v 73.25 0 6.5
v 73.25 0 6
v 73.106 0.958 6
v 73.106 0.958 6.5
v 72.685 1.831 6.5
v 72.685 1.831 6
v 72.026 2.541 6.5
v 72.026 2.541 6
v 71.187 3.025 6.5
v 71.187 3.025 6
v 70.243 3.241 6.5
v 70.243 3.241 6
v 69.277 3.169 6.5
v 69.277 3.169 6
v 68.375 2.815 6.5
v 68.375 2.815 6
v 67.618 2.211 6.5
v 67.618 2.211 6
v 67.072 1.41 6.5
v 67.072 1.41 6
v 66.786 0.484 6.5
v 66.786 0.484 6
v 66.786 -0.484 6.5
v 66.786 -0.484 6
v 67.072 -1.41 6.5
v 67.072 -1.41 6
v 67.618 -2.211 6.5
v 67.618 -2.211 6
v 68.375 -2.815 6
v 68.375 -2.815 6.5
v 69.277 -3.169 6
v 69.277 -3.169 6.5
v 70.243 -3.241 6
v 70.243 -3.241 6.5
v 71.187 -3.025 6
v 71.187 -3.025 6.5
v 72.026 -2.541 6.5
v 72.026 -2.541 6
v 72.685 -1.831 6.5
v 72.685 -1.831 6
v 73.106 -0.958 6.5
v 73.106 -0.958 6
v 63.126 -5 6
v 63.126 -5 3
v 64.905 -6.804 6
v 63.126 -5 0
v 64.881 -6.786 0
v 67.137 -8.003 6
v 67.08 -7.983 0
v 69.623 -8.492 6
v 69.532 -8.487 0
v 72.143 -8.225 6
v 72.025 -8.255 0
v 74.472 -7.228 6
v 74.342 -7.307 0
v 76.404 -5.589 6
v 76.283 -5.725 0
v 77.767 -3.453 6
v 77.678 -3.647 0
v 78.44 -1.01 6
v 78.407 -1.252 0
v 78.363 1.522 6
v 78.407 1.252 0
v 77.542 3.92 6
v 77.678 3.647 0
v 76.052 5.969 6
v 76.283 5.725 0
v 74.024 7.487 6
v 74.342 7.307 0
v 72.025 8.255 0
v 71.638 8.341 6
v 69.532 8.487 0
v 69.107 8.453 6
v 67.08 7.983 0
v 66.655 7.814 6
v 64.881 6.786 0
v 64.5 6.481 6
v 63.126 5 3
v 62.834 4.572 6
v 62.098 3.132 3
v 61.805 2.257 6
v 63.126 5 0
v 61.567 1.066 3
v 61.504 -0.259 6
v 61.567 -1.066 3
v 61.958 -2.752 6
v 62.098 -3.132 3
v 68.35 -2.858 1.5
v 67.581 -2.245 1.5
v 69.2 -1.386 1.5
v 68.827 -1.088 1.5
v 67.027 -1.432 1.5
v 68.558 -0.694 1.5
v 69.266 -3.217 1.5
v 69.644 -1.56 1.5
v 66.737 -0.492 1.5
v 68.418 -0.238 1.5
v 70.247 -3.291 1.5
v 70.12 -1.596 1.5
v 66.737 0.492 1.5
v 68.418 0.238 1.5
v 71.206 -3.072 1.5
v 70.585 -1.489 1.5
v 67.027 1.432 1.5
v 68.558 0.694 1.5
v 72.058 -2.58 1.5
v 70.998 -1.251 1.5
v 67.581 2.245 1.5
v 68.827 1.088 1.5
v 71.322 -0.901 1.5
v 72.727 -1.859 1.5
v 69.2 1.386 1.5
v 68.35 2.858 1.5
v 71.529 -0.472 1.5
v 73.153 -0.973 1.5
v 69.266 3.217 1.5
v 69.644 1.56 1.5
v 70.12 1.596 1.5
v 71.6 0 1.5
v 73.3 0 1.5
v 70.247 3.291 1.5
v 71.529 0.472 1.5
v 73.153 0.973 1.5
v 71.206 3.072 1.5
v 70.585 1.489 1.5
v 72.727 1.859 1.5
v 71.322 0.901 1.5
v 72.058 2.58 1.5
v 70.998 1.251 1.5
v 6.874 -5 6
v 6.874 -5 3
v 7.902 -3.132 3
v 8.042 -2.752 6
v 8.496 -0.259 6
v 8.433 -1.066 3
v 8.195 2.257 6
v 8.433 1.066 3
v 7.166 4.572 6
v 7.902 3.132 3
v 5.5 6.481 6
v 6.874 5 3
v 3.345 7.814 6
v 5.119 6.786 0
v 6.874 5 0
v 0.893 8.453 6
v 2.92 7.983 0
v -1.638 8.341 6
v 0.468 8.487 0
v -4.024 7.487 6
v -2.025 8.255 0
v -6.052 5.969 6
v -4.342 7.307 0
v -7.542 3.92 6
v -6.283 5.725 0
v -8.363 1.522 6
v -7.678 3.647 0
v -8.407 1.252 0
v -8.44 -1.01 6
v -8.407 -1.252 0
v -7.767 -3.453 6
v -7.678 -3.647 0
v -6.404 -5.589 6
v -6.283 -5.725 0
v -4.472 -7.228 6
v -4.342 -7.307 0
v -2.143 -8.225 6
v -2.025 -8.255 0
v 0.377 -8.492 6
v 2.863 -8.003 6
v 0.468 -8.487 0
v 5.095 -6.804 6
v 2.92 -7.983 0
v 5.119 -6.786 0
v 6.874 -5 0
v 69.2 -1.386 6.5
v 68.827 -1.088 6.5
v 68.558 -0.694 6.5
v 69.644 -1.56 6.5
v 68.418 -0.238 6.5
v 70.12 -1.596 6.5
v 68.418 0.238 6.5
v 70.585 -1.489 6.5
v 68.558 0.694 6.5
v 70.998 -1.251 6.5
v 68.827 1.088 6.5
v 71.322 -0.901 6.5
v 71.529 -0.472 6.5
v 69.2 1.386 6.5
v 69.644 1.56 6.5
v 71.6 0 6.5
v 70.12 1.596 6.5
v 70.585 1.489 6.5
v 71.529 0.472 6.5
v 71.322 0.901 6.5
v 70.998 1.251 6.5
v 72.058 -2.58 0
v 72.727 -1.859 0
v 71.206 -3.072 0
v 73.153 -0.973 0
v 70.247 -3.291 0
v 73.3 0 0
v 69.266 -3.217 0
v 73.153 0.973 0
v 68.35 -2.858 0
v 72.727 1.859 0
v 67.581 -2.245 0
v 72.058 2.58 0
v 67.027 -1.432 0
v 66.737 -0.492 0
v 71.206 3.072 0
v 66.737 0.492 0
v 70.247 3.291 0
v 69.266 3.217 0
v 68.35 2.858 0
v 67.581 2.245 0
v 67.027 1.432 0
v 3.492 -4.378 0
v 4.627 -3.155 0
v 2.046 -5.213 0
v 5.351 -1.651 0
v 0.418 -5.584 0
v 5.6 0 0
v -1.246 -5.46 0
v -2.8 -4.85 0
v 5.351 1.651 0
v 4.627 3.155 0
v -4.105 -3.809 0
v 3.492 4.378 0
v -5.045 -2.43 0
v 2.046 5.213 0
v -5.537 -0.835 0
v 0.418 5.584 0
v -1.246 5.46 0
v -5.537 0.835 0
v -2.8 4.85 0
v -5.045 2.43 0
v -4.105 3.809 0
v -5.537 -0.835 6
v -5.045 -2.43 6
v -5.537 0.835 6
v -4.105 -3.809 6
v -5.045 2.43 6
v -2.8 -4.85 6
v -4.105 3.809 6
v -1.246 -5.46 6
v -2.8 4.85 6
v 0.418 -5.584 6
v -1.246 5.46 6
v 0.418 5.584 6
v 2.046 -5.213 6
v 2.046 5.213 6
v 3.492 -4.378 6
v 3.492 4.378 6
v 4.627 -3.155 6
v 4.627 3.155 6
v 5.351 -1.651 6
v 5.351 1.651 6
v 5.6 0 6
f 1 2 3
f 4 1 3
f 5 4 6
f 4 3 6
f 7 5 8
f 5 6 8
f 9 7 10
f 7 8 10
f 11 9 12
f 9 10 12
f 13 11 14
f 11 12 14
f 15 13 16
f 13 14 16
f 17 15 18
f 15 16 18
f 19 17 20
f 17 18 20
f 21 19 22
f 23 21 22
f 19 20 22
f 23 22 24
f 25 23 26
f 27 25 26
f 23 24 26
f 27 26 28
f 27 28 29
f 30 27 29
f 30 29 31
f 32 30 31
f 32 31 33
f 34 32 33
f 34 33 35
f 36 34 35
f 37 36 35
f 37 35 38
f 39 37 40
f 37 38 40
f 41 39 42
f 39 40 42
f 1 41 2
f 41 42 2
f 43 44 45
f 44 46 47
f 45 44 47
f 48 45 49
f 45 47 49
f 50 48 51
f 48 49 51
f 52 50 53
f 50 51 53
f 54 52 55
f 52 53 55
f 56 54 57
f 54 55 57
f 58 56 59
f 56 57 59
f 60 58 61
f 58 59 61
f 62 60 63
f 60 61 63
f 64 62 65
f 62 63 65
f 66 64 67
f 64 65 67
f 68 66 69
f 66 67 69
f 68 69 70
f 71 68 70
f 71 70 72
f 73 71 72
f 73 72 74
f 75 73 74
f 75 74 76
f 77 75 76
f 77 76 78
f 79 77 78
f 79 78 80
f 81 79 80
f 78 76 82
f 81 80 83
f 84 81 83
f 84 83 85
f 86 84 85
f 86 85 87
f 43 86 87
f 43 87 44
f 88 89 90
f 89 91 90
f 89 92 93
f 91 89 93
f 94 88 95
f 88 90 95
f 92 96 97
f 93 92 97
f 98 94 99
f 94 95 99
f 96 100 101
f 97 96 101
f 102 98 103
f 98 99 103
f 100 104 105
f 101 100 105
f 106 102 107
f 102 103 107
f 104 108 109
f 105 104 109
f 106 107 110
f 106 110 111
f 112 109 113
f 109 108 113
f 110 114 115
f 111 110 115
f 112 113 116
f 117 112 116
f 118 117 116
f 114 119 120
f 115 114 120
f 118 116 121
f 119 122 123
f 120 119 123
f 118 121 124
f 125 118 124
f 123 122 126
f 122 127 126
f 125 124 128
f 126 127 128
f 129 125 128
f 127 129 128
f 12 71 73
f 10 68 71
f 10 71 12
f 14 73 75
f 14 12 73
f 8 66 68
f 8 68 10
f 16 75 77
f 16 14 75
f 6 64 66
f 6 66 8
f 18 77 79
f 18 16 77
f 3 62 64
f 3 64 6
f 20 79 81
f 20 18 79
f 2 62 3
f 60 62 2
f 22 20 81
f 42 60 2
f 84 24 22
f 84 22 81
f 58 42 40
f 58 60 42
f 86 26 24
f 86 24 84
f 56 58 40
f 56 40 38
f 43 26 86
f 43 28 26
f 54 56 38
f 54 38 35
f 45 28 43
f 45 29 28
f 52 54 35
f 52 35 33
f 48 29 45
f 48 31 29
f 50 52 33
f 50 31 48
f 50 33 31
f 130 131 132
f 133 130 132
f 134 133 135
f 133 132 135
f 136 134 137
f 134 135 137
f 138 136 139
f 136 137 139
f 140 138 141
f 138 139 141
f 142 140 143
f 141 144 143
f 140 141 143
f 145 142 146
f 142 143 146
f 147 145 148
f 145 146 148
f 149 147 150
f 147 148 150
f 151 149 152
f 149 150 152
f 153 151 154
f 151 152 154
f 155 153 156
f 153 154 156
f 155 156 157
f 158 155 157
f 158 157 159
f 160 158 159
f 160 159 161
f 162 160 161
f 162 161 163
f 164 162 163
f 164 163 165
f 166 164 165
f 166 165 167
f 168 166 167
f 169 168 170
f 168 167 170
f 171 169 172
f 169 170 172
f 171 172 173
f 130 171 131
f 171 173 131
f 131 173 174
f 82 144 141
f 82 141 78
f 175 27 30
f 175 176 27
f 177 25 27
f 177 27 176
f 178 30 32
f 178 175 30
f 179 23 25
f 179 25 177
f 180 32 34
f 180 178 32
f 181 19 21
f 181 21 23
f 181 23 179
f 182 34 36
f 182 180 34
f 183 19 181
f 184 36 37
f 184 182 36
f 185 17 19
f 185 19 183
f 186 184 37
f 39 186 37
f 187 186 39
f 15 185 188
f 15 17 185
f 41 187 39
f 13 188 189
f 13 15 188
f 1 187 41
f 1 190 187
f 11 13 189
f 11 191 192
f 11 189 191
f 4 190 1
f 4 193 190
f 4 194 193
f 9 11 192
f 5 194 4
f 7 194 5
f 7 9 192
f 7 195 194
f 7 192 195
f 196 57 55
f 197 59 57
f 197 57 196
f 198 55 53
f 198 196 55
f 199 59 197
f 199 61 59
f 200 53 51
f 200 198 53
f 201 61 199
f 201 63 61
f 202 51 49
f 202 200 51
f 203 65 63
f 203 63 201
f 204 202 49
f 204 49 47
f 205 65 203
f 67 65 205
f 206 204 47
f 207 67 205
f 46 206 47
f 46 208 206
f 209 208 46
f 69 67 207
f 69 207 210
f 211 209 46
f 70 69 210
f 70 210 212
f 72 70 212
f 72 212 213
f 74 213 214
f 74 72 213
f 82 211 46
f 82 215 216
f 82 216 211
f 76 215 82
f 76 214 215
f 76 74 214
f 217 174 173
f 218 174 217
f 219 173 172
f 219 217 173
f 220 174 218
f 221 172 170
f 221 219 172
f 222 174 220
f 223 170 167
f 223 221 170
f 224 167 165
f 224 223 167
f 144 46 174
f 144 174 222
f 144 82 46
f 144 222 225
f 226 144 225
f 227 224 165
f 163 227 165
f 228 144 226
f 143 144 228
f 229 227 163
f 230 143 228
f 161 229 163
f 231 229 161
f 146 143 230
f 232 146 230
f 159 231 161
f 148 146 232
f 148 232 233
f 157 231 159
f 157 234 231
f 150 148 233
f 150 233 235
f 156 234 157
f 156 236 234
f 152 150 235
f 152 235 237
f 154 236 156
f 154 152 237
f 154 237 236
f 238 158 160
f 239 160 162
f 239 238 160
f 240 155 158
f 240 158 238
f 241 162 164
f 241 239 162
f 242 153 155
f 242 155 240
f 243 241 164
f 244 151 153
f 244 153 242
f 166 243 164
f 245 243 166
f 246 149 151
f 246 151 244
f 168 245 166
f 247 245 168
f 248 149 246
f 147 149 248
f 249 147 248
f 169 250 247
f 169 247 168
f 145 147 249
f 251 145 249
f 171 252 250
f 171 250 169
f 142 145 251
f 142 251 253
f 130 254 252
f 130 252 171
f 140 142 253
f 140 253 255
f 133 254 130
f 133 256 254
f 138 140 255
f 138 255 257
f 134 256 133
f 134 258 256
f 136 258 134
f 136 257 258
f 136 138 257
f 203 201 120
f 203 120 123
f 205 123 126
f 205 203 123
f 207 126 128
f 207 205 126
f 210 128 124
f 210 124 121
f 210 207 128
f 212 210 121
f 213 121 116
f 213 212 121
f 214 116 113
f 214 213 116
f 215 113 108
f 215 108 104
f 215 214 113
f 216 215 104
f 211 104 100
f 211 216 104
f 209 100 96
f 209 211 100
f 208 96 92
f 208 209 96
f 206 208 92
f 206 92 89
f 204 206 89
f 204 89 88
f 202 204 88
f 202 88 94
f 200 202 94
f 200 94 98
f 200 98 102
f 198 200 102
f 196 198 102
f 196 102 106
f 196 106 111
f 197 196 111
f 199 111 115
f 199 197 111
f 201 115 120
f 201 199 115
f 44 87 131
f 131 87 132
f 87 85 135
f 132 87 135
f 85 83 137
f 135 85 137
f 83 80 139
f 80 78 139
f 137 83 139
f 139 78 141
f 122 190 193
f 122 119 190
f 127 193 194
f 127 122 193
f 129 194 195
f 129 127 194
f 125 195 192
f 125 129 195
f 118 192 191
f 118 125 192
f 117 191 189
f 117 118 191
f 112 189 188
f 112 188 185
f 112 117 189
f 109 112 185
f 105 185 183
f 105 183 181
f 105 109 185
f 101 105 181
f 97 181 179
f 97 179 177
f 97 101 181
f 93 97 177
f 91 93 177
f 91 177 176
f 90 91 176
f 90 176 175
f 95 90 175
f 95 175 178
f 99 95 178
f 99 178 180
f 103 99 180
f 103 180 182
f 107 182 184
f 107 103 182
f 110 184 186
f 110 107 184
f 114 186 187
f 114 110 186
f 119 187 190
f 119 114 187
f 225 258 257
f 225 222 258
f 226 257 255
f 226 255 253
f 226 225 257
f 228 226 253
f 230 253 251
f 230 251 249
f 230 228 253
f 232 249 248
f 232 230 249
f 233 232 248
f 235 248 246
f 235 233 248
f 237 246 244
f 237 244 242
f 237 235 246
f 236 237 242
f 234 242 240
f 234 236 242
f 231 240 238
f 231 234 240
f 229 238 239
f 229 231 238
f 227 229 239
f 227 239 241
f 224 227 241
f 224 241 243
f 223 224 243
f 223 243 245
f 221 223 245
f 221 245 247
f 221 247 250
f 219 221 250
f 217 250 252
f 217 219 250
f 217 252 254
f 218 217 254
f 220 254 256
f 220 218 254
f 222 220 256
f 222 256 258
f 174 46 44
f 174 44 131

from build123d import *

# Parameters (mm, degrees)
SKETCH1_R           = 5.6
BOSS_EXTRUDE1_DEPTH = 3
SKETCH2_R           = 8.5
SKETCH2_R_2         = 5.6
BOSS_EXTRUDE2_DEPTH = 6
SKETCH3_R           = 8.5
BOSS_EXTRUDE3_DEPTH = 6
SKETCH4_R           = 1.6
CUT_EXTRUDE1_DEPTH  = 80.186488747
SKETCH5_R           = 3.3
CUT_EXTRUDE2_DEPTH  = 1.5
BOSS_EXTRUDE4_START = 6
SKETCH6_R           = 3.25
SKETCH6_R_2         = 1.6
BOSS_EXTRUDE4_DEPTH = 0.5


with BuildPart() as part:
    # Sketch1 → Boss-Extrude1 (new body)
    with BuildSketch(Plane.XY):
        with BuildLine():
            Line((6.873863542, 5), (63.126136458, 5))
            ThreePointArc((63.126136458, 5), (78.5, 0), (63.126136458, -5))
            Line((63.126136458, -5), (6.873863542, -5))
            ThreePointArc((6.873863542, -5), (-8.5, 0), (6.873863542, 5))
        make_face()
        Circle(SKETCH1_R, mode=Mode.SUBTRACT)
    extrude(amount=BOSS_EXTRUDE1_DEPTH)

    # Sketch2 → Boss-Extrude2 (add)
    with BuildSketch(Plane.XY):
        with Locations(Location((0, 0, 0), (0, 0, 323.968120928))):
            Circle(SKETCH2_R)
        Circle(SKETCH2_R_2, mode=Mode.SUBTRACT)
    extrude(amount=BOSS_EXTRUDE2_DEPTH)

    # Sketch3 → Boss-Extrude3 (add)
    with BuildSketch(Plane.XY):
        with Locations(Location((70, 0, 0), (0, 0, 216.031879072))):
            Circle(SKETCH3_R)
    extrude(amount=BOSS_EXTRUDE3_DEPTH)

    # Sketch4 → Cut-Extrude1 (cut, through all)
    with BuildSketch(Plane.XY):
        with Locations((70, 0)):
            Circle(SKETCH4_R)
    extrude(amount=CUT_EXTRUDE1_DEPTH, mode=Mode.SUBTRACT)

    # Sketch5 → Cut-Extrude2 (cut)
    with BuildSketch(Plane.XY):
        with Locations((70, 0)):
            Circle(SKETCH5_R)
    extrude(amount=CUT_EXTRUDE2_DEPTH, mode=Mode.SUBTRACT)

    # Sketch6 → Boss-Extrude4 (add)
    with BuildSketch(Plane.XY.offset(BOSS_EXTRUDE4_START)):
        with Locations((70, 0)):
            Circle(SKETCH6_R)
        with Locations((70, 0)):
            Circle(SKETCH6_R_2, mode=Mode.SUBTRACT)
    extrude(amount=BOSS_EXTRUDE4_DEPTH)


solid = part.part
